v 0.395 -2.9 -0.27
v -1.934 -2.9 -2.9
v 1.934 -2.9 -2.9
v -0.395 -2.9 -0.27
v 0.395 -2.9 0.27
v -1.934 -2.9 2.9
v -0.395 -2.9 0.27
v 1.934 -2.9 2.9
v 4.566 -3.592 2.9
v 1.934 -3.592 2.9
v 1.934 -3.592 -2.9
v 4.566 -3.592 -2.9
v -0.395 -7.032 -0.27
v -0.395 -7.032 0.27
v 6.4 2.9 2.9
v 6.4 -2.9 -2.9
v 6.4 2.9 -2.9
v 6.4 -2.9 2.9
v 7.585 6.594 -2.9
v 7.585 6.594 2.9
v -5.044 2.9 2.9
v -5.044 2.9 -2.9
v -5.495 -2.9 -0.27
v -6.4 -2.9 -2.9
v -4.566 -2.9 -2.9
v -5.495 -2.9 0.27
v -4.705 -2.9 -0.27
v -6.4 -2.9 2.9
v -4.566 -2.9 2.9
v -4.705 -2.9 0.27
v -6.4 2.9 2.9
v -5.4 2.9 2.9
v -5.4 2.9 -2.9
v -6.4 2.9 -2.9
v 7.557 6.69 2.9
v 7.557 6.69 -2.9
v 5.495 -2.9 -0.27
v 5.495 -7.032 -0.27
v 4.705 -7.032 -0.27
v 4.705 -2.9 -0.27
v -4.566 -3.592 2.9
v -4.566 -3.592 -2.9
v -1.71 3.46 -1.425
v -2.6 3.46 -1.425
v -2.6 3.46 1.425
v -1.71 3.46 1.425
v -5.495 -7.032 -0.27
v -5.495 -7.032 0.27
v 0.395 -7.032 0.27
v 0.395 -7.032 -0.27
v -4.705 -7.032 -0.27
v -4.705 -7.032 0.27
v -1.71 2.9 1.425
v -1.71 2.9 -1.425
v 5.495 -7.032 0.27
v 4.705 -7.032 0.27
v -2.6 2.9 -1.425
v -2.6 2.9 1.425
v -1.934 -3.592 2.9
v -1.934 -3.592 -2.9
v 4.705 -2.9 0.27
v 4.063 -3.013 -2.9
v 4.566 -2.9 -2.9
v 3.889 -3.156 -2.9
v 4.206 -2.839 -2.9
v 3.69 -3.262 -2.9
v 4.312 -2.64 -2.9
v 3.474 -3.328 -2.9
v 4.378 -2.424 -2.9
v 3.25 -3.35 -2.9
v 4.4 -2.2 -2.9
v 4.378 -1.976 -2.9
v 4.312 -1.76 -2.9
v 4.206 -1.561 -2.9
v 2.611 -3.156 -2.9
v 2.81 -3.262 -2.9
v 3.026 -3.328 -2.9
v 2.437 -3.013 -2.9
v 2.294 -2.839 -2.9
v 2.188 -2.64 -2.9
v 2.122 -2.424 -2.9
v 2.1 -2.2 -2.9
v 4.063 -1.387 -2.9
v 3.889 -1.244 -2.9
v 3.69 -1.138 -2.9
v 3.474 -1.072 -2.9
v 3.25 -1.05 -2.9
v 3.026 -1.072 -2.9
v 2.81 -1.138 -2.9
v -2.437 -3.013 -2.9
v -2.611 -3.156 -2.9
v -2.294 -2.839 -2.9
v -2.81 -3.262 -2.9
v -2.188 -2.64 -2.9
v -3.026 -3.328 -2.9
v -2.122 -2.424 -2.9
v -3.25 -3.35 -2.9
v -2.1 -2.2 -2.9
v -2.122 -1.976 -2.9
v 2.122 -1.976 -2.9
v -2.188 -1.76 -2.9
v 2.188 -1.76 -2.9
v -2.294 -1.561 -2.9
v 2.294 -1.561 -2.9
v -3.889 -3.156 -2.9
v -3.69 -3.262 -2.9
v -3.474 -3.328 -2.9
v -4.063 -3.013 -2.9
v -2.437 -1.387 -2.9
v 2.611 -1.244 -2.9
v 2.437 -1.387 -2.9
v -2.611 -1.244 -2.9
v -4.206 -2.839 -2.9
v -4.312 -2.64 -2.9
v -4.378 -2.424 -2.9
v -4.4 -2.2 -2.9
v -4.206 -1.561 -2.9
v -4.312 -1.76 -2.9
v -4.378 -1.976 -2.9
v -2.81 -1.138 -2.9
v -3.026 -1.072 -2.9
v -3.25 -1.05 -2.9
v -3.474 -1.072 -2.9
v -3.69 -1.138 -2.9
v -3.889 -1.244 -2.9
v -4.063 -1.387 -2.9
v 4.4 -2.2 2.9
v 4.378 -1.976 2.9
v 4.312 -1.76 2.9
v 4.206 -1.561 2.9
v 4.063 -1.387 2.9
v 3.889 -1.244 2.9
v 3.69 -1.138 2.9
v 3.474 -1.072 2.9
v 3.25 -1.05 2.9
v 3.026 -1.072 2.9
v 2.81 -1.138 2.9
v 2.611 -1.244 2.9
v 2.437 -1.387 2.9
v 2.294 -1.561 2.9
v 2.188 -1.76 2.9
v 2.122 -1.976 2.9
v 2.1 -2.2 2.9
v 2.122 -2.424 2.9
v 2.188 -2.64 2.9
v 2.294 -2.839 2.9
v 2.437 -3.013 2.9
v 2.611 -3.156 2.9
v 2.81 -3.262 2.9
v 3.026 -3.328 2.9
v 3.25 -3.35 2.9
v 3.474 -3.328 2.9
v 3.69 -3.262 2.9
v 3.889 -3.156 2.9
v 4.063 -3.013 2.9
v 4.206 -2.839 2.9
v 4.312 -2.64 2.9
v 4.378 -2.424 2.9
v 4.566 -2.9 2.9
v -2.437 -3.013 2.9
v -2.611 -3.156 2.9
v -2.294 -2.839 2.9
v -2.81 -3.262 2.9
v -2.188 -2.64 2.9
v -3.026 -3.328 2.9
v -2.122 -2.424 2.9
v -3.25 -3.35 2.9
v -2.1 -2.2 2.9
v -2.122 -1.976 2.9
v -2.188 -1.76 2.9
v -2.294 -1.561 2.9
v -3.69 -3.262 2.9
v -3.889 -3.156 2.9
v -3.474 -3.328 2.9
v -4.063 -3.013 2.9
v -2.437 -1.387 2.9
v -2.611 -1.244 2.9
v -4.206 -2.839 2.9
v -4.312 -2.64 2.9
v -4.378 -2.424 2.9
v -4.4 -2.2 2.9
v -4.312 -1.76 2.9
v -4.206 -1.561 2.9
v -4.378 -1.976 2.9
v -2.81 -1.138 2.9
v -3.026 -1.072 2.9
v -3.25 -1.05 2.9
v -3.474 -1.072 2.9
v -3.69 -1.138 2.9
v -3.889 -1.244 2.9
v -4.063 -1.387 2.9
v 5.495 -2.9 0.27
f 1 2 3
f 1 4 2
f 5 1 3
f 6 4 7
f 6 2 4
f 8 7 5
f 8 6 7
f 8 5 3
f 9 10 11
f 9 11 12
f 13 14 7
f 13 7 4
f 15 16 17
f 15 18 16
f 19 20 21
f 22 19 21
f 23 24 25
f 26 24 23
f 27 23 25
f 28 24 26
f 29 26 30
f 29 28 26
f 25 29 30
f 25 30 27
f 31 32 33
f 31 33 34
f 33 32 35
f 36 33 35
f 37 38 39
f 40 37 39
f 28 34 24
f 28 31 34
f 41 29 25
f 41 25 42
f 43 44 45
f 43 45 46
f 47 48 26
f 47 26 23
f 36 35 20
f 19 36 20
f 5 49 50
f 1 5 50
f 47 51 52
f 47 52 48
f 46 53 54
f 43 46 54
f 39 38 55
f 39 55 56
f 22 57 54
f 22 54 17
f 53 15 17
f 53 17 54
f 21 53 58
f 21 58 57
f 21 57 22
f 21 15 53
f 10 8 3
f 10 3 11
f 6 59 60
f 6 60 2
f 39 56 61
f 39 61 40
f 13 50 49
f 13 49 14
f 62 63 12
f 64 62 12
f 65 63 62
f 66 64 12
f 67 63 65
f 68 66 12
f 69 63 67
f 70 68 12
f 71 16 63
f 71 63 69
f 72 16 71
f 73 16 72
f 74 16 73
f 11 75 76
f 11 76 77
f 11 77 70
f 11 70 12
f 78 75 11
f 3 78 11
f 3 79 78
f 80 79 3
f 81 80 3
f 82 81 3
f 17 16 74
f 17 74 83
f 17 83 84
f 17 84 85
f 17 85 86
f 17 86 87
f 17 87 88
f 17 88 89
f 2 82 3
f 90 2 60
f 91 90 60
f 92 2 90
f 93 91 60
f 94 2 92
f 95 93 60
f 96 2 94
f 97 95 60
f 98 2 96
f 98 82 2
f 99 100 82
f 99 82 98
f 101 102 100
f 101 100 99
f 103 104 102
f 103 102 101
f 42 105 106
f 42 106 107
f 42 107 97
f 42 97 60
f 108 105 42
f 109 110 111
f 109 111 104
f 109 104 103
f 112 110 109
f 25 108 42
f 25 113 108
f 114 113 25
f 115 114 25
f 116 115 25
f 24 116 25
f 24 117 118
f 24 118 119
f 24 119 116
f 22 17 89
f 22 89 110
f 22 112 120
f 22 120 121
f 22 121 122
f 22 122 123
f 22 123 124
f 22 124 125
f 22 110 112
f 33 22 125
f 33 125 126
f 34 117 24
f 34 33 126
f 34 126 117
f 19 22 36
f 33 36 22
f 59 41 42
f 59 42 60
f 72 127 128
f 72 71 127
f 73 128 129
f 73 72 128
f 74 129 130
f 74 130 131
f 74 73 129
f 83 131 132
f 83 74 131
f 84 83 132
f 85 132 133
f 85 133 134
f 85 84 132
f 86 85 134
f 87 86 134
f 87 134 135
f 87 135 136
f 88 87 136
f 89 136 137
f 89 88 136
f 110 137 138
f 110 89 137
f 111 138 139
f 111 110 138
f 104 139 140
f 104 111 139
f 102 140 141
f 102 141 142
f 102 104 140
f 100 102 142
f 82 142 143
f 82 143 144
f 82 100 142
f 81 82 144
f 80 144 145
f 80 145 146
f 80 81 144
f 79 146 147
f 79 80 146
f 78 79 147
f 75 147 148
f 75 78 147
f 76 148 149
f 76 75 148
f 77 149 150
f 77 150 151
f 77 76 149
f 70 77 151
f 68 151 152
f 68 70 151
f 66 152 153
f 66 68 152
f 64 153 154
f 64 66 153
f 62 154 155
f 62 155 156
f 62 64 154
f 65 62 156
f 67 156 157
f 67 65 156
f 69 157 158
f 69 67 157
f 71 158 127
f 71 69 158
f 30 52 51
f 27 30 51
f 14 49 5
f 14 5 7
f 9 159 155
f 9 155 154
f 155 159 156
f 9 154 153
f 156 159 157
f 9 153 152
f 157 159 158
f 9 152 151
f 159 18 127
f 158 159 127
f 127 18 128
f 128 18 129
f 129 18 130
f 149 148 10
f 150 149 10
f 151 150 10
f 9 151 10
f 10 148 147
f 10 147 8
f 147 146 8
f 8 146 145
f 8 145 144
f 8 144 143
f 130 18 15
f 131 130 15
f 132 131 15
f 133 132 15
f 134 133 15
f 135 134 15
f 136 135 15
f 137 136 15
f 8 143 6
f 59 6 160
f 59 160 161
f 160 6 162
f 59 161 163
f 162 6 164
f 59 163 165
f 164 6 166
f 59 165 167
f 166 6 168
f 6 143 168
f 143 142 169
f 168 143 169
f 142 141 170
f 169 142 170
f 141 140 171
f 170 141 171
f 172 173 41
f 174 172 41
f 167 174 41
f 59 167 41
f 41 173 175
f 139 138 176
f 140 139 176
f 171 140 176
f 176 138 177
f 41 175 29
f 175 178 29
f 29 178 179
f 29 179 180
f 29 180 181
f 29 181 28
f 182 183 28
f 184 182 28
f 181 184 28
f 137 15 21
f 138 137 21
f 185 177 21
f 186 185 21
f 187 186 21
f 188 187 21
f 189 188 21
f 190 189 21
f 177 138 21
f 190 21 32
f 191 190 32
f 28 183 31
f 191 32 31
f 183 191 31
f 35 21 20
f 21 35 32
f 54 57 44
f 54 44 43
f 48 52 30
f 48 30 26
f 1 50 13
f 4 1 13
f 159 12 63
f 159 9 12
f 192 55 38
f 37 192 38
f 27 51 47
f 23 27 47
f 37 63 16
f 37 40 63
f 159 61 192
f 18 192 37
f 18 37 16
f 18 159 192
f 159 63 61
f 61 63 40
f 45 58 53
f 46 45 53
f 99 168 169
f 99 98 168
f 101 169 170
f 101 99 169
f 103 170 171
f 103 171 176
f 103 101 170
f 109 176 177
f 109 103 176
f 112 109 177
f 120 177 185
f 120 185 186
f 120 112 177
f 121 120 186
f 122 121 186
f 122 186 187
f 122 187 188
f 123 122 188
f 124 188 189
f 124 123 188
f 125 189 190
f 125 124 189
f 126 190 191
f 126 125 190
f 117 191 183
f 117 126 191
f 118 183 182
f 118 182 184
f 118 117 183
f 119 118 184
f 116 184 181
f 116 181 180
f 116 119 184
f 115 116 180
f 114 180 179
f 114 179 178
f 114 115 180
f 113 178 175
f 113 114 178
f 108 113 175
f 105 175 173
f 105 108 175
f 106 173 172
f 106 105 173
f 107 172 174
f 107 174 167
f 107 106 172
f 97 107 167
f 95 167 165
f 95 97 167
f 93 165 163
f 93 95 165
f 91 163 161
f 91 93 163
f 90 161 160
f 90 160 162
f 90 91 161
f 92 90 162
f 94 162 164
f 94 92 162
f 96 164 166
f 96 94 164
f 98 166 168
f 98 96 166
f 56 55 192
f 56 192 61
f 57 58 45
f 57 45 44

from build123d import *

# Parameters (mm, degrees)
SKETCH1_R           = 1.15
BOSS_EXTRUDE1_DEPTH = 2.9
EXTRUDE_THIN1_DEPTH = 5.8
BOSS_EXTRUDE2_REACH = 15.722
SKETCH4_W           = 0.79
SKETCH4_H           = 0.54
SKETCH5_W           = 0.89
SKETCH5_H           = 2.85
BOSS_EXTRUDE3_DEPTH = 0.56


with BuildPart() as part:
    # Sketch1 → Boss-Extrude1 (new body, symmetric)
    with BuildSketch(Plane.XY):
        Polygon((-6.4, -2.9), (-4.565838245, -2.9), (-4.565838245, -3.592341201), (-1.934161755, -3.592341201), (-1.934161755, -2.9), (1.934161755, -2.9), (1.934161755, -3.592341201), (4.565838245, -3.592341201), (4.565838245, -2.9), (6.4, -2.9), (6.4, 2.9), (-6.4, 2.9), align=None)
        with Locations((-3.25, -2.2)):
            Circle(SKETCH1_R, mode=Mode.SUBTRACT)
        with Locations((3.25, -2.2)):
            Circle(SKETCH1_R, mode=Mode.SUBTRACT)
    extrude(amount=BOSS_EXTRUDE1_DEPTH, both=True)

    # Sketch2 → Extrude-Thin1 (add)
    with BuildSketch(Plane.XY.offset(2.9)):
        Polygon((-5.4, 2.9), (7.557079146, 6.69), (7.58515322, 6.594021636), (-5.371925926, 2.804021636), align=None)
    extrude(amount=-EXTRUDE_THIN1_DEPTH)

    # Sketch4 → Boss-Extrude2 (add, up to next)
    with BuildSketch(Plane(origin=(0, -7.032341201, 0), x_dir=(-1, 0, 0), z_dir=(0, -1, 0)), mode=Mode.PRIVATE) as boss_extrude2_sk1:
        Rectangle(SKETCH4_W, SKETCH4_H)
    boss_extrude2_tool1 = extrude(boss_extrude2_sk1.sketch, amount=-BOSS_EXTRUDE2_REACH, mode=Mode.PRIVATE) - part.part
    add(boss_extrude2_tool1.solids().sort_by_distance((0, -7.032341, 0))[0])
    # Sketch4 → Boss-Extrude2 (add, up to next)
    with BuildSketch(Plane(origin=(0, -7.032341201, 0), x_dir=(-1, 0, 0), z_dir=(0, -1, 0)), mode=Mode.PRIVATE) as boss_extrude2_sk2:
        with Locations((5.1, 0)):
            Rectangle(SKETCH4_W, SKETCH4_H)
    boss_extrude2_tool2 = extrude(boss_extrude2_sk2.sketch, amount=-BOSS_EXTRUDE2_REACH, mode=Mode.PRIVATE) - part.part
    add(boss_extrude2_tool2.solids().sort_by_distance((-5.1, -7.032341, 0))[0])
    # Sketch4 → Boss-Extrude2 (add, up to next)
    with BuildSketch(Plane(origin=(0, -7.032341201, 0), x_dir=(-1, 0, 0), z_dir=(0, -1, 0)), mode=Mode.PRIVATE) as boss_extrude2_sk3:
        with Locations((-5.1, 0)):
            Rectangle(SKETCH4_W, SKETCH4_H)
    boss_extrude2_tool3 = extrude(boss_extrude2_sk3.sketch, amount=-BOSS_EXTRUDE2_REACH, mode=Mode.PRIVATE) - part.part
    add(boss_extrude2_tool3.solids().sort_by_distance((5.1, -7.032341, 0))[0])

    # Sketch5 → Boss-Extrude3 (add)
    with BuildSketch(Plane(origin=(0, 2.9, 0), x_dir=(1, 0, 0), z_dir=(0, 1, 0))):
        with Locations((-2.155, 0)):
            Rectangle(SKETCH5_W, SKETCH5_H)
    extrude(amount=BOSS_EXTRUDE3_DEPTH)


solid = part.part
